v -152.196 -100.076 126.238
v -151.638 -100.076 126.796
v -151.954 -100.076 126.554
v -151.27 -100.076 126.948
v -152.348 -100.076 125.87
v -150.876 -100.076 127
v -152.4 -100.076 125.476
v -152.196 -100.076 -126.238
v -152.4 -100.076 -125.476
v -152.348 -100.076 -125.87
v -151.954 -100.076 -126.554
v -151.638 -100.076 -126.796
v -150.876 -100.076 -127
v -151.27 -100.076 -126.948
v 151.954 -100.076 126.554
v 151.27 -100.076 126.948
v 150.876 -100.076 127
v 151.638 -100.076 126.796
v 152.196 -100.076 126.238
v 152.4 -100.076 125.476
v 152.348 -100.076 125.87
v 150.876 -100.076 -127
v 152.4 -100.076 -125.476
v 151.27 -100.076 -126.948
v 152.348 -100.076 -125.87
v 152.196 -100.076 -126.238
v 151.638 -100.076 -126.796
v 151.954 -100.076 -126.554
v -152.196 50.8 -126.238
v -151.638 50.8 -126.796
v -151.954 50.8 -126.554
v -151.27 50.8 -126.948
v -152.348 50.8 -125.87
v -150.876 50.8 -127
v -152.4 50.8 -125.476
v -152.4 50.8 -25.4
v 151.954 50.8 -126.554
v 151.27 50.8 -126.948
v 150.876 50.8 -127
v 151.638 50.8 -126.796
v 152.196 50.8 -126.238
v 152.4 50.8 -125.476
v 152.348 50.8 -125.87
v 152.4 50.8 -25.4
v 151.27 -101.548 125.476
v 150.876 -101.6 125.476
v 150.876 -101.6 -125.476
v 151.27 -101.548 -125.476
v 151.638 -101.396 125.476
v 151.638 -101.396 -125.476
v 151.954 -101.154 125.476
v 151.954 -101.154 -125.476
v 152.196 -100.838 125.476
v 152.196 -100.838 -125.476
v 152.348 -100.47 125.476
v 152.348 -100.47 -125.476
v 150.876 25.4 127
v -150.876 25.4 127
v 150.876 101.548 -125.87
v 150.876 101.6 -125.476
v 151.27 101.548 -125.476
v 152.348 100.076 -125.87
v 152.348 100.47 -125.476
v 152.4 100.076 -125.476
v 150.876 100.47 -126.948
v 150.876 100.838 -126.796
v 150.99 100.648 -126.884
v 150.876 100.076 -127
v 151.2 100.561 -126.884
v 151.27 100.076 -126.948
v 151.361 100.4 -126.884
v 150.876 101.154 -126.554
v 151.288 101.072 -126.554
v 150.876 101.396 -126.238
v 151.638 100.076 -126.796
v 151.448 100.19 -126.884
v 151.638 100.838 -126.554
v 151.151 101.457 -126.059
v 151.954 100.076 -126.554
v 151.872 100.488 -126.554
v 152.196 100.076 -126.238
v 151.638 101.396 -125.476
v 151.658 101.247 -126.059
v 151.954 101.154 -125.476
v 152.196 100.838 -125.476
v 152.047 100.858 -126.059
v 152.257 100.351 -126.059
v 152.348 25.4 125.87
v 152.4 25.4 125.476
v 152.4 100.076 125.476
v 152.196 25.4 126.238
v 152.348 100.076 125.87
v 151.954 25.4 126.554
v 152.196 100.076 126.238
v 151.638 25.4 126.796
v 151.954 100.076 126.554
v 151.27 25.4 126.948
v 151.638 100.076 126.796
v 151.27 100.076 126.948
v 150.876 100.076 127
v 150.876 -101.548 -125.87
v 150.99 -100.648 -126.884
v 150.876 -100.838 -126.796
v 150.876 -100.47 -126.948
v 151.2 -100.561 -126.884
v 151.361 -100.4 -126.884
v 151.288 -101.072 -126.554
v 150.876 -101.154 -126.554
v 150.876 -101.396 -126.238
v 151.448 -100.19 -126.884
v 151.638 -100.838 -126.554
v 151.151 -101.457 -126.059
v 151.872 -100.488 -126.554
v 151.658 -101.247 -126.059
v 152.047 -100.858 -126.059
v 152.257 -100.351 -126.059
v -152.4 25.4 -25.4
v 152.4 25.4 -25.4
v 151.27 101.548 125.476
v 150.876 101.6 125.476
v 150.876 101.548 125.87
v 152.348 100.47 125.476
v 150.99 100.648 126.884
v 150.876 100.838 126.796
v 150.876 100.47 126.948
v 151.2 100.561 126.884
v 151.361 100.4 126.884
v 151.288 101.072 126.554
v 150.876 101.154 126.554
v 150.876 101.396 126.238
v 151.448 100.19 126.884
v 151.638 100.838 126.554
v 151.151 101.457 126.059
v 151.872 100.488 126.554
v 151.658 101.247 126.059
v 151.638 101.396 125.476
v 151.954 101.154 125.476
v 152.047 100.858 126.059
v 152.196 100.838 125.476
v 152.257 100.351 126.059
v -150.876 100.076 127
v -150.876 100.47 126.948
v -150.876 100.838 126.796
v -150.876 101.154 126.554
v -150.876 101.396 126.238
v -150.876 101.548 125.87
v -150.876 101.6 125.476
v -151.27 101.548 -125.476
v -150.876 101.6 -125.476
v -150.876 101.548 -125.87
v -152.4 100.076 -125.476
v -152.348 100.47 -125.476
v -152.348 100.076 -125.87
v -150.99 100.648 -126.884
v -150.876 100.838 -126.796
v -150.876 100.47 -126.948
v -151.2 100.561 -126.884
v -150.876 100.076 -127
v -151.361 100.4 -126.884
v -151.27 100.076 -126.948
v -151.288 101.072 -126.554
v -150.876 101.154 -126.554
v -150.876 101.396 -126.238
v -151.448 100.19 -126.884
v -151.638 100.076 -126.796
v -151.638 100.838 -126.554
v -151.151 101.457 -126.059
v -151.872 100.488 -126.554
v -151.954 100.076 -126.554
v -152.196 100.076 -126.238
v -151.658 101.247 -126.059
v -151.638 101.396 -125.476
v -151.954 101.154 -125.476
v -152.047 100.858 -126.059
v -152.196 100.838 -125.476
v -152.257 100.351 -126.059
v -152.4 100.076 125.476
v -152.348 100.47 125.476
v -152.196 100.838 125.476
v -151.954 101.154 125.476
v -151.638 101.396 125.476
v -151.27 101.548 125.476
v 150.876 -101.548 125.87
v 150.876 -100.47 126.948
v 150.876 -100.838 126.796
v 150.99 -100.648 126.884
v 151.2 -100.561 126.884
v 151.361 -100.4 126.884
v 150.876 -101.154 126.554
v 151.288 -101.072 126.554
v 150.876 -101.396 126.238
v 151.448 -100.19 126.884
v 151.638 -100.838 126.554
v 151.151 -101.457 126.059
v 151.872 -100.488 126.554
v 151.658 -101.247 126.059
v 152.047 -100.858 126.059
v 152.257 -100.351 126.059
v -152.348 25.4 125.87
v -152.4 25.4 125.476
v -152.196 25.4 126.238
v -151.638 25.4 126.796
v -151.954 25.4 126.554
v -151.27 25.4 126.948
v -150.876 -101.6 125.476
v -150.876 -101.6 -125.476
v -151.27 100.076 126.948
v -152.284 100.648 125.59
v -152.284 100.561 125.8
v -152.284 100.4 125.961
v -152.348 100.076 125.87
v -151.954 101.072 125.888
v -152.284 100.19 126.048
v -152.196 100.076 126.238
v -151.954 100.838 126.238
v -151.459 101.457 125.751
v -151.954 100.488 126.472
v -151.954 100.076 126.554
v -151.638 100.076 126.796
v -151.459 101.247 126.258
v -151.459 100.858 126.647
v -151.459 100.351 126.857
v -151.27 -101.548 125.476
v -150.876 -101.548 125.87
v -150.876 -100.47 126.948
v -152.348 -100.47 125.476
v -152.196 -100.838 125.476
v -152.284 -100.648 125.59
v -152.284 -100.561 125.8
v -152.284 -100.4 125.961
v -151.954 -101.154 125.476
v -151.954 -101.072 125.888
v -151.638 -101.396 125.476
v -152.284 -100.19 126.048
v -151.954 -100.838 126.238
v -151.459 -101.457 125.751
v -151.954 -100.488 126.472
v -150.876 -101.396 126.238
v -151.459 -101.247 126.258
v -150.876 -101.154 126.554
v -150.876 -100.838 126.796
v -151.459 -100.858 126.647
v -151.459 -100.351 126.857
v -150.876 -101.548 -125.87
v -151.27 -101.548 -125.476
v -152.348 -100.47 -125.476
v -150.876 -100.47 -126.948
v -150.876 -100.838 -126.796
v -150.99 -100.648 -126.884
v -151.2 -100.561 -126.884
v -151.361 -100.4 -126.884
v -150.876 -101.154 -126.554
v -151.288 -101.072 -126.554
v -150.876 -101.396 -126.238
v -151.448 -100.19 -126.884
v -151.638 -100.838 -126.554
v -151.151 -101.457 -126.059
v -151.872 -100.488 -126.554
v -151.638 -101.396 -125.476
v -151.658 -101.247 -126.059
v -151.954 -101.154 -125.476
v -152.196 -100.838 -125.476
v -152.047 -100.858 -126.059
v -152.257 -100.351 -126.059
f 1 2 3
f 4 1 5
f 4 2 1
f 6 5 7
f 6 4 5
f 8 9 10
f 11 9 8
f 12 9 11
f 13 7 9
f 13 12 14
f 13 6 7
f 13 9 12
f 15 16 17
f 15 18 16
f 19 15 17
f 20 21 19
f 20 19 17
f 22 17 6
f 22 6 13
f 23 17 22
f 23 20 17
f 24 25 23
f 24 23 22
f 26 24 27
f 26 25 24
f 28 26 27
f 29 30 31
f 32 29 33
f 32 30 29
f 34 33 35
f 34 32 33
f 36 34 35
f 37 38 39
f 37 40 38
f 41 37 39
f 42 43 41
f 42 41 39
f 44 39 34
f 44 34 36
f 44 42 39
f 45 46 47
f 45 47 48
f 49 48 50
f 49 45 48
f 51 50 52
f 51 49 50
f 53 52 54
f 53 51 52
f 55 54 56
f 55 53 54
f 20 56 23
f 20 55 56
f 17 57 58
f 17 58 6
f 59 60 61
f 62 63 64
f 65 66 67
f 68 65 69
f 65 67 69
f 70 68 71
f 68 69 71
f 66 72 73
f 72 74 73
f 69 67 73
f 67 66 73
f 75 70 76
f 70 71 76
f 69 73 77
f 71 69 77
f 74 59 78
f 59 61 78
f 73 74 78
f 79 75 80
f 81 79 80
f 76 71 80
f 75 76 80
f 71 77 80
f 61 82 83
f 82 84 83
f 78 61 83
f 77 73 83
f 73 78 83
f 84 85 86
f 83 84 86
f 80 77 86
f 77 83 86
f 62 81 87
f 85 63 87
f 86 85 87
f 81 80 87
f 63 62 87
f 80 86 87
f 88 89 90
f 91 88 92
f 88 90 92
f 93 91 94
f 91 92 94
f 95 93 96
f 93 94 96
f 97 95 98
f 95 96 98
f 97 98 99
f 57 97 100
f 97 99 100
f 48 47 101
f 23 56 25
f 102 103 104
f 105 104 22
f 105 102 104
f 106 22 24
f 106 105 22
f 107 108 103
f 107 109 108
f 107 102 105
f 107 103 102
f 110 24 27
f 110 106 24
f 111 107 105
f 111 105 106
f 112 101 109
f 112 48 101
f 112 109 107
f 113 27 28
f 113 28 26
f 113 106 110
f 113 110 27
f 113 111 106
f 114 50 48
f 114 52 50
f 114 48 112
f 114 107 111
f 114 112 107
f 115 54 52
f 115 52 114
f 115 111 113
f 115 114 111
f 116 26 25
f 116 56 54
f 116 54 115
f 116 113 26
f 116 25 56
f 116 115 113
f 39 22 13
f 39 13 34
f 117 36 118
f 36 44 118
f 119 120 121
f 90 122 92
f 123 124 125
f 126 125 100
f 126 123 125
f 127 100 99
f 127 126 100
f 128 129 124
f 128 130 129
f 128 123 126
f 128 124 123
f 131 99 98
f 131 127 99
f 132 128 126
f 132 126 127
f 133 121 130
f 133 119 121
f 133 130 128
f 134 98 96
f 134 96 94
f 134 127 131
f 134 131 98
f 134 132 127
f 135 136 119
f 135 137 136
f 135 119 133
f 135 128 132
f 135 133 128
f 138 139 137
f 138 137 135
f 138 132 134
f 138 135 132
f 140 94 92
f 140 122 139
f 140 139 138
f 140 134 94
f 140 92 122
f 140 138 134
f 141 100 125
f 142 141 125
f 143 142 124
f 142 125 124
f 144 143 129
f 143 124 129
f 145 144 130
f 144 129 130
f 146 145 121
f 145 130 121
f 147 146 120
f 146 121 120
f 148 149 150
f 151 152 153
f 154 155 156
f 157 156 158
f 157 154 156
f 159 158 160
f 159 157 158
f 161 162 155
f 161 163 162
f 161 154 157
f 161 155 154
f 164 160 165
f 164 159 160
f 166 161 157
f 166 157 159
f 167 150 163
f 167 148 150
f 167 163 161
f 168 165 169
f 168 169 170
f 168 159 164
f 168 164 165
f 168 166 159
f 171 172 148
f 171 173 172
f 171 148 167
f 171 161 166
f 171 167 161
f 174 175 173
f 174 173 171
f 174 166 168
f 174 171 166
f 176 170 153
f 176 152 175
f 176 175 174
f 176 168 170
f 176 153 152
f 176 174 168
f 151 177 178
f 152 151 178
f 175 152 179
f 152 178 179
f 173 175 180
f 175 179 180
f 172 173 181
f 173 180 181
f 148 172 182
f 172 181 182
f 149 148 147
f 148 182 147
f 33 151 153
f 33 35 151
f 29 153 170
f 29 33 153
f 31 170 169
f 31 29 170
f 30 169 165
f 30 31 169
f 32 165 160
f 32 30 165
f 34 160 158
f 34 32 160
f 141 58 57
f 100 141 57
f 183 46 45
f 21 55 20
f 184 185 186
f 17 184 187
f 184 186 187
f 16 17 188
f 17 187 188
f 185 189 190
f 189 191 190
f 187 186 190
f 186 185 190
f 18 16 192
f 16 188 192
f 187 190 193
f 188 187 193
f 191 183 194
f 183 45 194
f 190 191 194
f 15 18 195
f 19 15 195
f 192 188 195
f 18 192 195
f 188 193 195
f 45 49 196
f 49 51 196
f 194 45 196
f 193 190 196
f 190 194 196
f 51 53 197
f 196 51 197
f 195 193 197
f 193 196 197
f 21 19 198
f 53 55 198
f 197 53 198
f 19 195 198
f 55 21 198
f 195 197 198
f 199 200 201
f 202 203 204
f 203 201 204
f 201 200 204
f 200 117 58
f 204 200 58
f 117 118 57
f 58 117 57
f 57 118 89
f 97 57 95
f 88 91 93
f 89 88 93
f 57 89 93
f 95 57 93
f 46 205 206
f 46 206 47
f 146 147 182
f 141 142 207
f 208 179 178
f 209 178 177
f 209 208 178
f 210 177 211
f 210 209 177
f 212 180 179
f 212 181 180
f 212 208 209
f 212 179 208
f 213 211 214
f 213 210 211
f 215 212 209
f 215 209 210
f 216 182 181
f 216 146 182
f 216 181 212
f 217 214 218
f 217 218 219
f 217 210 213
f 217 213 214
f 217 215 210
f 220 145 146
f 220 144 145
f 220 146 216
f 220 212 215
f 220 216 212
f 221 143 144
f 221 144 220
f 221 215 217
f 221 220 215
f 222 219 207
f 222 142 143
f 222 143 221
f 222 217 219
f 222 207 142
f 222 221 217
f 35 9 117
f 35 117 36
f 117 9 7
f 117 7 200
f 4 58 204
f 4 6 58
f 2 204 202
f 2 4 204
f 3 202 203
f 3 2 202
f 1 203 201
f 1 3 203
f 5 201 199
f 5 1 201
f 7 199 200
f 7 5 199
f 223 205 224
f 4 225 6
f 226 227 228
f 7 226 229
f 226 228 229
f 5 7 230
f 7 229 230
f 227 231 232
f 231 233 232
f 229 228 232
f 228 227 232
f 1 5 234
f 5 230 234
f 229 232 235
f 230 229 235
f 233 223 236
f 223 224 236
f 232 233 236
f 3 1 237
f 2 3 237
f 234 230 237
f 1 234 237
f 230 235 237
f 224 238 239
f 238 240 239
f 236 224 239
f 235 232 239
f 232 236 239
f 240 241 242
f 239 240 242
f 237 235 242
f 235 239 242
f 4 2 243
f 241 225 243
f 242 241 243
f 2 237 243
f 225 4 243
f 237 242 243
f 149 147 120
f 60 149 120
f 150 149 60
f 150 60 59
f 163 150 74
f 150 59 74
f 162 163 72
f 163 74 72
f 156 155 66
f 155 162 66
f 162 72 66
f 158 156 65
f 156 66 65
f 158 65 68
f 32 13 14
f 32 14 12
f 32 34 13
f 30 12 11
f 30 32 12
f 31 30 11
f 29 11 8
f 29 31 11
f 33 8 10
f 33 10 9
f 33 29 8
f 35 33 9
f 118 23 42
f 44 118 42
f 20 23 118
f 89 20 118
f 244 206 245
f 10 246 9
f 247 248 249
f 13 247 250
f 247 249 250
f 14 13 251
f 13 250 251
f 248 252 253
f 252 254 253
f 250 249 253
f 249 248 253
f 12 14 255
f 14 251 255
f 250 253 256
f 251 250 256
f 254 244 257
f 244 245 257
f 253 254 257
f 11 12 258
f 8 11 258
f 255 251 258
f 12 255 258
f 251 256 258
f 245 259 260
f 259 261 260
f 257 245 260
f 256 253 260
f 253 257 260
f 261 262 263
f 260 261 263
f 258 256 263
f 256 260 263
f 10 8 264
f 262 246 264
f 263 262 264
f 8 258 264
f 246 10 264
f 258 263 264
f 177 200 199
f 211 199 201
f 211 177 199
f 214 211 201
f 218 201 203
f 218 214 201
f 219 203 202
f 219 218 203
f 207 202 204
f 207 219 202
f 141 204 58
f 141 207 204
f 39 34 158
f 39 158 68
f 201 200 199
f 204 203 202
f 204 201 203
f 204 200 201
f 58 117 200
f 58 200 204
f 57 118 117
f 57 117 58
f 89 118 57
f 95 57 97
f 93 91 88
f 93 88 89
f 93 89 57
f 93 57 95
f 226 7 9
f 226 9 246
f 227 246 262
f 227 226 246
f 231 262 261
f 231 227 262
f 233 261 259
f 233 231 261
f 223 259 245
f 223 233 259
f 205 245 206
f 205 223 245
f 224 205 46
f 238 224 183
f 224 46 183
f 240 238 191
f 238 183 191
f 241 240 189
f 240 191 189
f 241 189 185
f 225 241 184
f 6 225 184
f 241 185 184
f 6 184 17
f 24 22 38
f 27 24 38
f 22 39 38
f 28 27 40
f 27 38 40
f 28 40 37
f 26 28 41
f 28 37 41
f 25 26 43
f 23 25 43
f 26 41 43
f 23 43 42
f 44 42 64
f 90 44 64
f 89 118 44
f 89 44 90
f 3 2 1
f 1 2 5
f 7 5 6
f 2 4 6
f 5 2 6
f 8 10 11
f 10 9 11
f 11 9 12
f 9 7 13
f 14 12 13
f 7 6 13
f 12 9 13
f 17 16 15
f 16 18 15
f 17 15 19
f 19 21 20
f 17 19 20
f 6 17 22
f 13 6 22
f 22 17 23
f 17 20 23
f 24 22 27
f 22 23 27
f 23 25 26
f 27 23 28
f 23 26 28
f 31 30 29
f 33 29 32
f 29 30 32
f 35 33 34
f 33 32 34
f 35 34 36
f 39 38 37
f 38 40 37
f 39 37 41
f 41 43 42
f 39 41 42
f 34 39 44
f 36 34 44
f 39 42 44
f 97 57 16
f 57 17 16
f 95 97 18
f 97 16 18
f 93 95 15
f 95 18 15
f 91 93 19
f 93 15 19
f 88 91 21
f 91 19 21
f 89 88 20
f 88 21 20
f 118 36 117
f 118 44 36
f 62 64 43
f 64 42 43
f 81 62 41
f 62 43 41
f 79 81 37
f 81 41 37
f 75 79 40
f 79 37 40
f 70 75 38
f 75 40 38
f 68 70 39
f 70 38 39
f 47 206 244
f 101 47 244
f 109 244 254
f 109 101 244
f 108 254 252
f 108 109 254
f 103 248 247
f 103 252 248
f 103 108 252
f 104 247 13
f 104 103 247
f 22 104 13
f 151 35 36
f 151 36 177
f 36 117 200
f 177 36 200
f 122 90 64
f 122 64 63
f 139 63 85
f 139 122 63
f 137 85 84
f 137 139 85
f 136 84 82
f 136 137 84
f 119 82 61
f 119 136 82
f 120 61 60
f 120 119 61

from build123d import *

# Parameters (mm, degrees)
F0_W     = 304.8
F0_H     = 254
F1_DEPTH = 101.6
F2_R     = 1.524
F4_DEPTH = 152.4
F6_R     = 1.524


with BuildPart() as f1:
    # F0 (on Front) → F1 (new body, symmetric)
    with BuildSketch(Plane.XZ):
        Rectangle(F0_W, F0_H)
    extrude(amount=F1_DEPTH, both=True)

    # F2
    f2_edges = [f1.edges().sort_by_distance(p)[0] for p in [
        (152.4, -101.6, 0),
        (0, -101.6, 127),
        (-152.4, -101.6, 0),
        (0, -101.6, -127),
        (152.4, 101.6, 0),
        (0, 101.6, 127),
        (-152.4, 101.6, 0),
        (0, 101.6, -127),
        (152.4, 0, 127),
        (-152.4, 0, 127),
        (152.4, 0, -127),
        (-152.4, 0, -127),
    ]]
    fillet(f2_edges, radius=F2_R)


with BuildPart() as f4:
    # F3 (on Right) → F4 (new body, symmetric)
    with BuildSketch(Plane.YZ):
        Polygon((25.4, 127), (-100.076, 127), (-100.076, -127), (50.8, -127), (50.8, -25.4), (25.4, -25.4), align=None)
    extrude(amount=F4_DEPTH, both=True)

    # F6
    f6_edges = [f4.edges().sort_by_distance(p)[0] for p in [
        (152.4, -37.338, 127),
        (152.4, -24.638, -127),
        (-152.4, -24.638, -127),
        (-152.4, -37.338, 127),
    ]]
    fillet(f6_edges, radius=F6_R)


with BuildPart() as f1_1:
    add(f1.part)

    # F5: cut F4
    add(f4.part, mode=Mode.SUBTRACT)


solid = Compound([f4.part, f1_1.part])
